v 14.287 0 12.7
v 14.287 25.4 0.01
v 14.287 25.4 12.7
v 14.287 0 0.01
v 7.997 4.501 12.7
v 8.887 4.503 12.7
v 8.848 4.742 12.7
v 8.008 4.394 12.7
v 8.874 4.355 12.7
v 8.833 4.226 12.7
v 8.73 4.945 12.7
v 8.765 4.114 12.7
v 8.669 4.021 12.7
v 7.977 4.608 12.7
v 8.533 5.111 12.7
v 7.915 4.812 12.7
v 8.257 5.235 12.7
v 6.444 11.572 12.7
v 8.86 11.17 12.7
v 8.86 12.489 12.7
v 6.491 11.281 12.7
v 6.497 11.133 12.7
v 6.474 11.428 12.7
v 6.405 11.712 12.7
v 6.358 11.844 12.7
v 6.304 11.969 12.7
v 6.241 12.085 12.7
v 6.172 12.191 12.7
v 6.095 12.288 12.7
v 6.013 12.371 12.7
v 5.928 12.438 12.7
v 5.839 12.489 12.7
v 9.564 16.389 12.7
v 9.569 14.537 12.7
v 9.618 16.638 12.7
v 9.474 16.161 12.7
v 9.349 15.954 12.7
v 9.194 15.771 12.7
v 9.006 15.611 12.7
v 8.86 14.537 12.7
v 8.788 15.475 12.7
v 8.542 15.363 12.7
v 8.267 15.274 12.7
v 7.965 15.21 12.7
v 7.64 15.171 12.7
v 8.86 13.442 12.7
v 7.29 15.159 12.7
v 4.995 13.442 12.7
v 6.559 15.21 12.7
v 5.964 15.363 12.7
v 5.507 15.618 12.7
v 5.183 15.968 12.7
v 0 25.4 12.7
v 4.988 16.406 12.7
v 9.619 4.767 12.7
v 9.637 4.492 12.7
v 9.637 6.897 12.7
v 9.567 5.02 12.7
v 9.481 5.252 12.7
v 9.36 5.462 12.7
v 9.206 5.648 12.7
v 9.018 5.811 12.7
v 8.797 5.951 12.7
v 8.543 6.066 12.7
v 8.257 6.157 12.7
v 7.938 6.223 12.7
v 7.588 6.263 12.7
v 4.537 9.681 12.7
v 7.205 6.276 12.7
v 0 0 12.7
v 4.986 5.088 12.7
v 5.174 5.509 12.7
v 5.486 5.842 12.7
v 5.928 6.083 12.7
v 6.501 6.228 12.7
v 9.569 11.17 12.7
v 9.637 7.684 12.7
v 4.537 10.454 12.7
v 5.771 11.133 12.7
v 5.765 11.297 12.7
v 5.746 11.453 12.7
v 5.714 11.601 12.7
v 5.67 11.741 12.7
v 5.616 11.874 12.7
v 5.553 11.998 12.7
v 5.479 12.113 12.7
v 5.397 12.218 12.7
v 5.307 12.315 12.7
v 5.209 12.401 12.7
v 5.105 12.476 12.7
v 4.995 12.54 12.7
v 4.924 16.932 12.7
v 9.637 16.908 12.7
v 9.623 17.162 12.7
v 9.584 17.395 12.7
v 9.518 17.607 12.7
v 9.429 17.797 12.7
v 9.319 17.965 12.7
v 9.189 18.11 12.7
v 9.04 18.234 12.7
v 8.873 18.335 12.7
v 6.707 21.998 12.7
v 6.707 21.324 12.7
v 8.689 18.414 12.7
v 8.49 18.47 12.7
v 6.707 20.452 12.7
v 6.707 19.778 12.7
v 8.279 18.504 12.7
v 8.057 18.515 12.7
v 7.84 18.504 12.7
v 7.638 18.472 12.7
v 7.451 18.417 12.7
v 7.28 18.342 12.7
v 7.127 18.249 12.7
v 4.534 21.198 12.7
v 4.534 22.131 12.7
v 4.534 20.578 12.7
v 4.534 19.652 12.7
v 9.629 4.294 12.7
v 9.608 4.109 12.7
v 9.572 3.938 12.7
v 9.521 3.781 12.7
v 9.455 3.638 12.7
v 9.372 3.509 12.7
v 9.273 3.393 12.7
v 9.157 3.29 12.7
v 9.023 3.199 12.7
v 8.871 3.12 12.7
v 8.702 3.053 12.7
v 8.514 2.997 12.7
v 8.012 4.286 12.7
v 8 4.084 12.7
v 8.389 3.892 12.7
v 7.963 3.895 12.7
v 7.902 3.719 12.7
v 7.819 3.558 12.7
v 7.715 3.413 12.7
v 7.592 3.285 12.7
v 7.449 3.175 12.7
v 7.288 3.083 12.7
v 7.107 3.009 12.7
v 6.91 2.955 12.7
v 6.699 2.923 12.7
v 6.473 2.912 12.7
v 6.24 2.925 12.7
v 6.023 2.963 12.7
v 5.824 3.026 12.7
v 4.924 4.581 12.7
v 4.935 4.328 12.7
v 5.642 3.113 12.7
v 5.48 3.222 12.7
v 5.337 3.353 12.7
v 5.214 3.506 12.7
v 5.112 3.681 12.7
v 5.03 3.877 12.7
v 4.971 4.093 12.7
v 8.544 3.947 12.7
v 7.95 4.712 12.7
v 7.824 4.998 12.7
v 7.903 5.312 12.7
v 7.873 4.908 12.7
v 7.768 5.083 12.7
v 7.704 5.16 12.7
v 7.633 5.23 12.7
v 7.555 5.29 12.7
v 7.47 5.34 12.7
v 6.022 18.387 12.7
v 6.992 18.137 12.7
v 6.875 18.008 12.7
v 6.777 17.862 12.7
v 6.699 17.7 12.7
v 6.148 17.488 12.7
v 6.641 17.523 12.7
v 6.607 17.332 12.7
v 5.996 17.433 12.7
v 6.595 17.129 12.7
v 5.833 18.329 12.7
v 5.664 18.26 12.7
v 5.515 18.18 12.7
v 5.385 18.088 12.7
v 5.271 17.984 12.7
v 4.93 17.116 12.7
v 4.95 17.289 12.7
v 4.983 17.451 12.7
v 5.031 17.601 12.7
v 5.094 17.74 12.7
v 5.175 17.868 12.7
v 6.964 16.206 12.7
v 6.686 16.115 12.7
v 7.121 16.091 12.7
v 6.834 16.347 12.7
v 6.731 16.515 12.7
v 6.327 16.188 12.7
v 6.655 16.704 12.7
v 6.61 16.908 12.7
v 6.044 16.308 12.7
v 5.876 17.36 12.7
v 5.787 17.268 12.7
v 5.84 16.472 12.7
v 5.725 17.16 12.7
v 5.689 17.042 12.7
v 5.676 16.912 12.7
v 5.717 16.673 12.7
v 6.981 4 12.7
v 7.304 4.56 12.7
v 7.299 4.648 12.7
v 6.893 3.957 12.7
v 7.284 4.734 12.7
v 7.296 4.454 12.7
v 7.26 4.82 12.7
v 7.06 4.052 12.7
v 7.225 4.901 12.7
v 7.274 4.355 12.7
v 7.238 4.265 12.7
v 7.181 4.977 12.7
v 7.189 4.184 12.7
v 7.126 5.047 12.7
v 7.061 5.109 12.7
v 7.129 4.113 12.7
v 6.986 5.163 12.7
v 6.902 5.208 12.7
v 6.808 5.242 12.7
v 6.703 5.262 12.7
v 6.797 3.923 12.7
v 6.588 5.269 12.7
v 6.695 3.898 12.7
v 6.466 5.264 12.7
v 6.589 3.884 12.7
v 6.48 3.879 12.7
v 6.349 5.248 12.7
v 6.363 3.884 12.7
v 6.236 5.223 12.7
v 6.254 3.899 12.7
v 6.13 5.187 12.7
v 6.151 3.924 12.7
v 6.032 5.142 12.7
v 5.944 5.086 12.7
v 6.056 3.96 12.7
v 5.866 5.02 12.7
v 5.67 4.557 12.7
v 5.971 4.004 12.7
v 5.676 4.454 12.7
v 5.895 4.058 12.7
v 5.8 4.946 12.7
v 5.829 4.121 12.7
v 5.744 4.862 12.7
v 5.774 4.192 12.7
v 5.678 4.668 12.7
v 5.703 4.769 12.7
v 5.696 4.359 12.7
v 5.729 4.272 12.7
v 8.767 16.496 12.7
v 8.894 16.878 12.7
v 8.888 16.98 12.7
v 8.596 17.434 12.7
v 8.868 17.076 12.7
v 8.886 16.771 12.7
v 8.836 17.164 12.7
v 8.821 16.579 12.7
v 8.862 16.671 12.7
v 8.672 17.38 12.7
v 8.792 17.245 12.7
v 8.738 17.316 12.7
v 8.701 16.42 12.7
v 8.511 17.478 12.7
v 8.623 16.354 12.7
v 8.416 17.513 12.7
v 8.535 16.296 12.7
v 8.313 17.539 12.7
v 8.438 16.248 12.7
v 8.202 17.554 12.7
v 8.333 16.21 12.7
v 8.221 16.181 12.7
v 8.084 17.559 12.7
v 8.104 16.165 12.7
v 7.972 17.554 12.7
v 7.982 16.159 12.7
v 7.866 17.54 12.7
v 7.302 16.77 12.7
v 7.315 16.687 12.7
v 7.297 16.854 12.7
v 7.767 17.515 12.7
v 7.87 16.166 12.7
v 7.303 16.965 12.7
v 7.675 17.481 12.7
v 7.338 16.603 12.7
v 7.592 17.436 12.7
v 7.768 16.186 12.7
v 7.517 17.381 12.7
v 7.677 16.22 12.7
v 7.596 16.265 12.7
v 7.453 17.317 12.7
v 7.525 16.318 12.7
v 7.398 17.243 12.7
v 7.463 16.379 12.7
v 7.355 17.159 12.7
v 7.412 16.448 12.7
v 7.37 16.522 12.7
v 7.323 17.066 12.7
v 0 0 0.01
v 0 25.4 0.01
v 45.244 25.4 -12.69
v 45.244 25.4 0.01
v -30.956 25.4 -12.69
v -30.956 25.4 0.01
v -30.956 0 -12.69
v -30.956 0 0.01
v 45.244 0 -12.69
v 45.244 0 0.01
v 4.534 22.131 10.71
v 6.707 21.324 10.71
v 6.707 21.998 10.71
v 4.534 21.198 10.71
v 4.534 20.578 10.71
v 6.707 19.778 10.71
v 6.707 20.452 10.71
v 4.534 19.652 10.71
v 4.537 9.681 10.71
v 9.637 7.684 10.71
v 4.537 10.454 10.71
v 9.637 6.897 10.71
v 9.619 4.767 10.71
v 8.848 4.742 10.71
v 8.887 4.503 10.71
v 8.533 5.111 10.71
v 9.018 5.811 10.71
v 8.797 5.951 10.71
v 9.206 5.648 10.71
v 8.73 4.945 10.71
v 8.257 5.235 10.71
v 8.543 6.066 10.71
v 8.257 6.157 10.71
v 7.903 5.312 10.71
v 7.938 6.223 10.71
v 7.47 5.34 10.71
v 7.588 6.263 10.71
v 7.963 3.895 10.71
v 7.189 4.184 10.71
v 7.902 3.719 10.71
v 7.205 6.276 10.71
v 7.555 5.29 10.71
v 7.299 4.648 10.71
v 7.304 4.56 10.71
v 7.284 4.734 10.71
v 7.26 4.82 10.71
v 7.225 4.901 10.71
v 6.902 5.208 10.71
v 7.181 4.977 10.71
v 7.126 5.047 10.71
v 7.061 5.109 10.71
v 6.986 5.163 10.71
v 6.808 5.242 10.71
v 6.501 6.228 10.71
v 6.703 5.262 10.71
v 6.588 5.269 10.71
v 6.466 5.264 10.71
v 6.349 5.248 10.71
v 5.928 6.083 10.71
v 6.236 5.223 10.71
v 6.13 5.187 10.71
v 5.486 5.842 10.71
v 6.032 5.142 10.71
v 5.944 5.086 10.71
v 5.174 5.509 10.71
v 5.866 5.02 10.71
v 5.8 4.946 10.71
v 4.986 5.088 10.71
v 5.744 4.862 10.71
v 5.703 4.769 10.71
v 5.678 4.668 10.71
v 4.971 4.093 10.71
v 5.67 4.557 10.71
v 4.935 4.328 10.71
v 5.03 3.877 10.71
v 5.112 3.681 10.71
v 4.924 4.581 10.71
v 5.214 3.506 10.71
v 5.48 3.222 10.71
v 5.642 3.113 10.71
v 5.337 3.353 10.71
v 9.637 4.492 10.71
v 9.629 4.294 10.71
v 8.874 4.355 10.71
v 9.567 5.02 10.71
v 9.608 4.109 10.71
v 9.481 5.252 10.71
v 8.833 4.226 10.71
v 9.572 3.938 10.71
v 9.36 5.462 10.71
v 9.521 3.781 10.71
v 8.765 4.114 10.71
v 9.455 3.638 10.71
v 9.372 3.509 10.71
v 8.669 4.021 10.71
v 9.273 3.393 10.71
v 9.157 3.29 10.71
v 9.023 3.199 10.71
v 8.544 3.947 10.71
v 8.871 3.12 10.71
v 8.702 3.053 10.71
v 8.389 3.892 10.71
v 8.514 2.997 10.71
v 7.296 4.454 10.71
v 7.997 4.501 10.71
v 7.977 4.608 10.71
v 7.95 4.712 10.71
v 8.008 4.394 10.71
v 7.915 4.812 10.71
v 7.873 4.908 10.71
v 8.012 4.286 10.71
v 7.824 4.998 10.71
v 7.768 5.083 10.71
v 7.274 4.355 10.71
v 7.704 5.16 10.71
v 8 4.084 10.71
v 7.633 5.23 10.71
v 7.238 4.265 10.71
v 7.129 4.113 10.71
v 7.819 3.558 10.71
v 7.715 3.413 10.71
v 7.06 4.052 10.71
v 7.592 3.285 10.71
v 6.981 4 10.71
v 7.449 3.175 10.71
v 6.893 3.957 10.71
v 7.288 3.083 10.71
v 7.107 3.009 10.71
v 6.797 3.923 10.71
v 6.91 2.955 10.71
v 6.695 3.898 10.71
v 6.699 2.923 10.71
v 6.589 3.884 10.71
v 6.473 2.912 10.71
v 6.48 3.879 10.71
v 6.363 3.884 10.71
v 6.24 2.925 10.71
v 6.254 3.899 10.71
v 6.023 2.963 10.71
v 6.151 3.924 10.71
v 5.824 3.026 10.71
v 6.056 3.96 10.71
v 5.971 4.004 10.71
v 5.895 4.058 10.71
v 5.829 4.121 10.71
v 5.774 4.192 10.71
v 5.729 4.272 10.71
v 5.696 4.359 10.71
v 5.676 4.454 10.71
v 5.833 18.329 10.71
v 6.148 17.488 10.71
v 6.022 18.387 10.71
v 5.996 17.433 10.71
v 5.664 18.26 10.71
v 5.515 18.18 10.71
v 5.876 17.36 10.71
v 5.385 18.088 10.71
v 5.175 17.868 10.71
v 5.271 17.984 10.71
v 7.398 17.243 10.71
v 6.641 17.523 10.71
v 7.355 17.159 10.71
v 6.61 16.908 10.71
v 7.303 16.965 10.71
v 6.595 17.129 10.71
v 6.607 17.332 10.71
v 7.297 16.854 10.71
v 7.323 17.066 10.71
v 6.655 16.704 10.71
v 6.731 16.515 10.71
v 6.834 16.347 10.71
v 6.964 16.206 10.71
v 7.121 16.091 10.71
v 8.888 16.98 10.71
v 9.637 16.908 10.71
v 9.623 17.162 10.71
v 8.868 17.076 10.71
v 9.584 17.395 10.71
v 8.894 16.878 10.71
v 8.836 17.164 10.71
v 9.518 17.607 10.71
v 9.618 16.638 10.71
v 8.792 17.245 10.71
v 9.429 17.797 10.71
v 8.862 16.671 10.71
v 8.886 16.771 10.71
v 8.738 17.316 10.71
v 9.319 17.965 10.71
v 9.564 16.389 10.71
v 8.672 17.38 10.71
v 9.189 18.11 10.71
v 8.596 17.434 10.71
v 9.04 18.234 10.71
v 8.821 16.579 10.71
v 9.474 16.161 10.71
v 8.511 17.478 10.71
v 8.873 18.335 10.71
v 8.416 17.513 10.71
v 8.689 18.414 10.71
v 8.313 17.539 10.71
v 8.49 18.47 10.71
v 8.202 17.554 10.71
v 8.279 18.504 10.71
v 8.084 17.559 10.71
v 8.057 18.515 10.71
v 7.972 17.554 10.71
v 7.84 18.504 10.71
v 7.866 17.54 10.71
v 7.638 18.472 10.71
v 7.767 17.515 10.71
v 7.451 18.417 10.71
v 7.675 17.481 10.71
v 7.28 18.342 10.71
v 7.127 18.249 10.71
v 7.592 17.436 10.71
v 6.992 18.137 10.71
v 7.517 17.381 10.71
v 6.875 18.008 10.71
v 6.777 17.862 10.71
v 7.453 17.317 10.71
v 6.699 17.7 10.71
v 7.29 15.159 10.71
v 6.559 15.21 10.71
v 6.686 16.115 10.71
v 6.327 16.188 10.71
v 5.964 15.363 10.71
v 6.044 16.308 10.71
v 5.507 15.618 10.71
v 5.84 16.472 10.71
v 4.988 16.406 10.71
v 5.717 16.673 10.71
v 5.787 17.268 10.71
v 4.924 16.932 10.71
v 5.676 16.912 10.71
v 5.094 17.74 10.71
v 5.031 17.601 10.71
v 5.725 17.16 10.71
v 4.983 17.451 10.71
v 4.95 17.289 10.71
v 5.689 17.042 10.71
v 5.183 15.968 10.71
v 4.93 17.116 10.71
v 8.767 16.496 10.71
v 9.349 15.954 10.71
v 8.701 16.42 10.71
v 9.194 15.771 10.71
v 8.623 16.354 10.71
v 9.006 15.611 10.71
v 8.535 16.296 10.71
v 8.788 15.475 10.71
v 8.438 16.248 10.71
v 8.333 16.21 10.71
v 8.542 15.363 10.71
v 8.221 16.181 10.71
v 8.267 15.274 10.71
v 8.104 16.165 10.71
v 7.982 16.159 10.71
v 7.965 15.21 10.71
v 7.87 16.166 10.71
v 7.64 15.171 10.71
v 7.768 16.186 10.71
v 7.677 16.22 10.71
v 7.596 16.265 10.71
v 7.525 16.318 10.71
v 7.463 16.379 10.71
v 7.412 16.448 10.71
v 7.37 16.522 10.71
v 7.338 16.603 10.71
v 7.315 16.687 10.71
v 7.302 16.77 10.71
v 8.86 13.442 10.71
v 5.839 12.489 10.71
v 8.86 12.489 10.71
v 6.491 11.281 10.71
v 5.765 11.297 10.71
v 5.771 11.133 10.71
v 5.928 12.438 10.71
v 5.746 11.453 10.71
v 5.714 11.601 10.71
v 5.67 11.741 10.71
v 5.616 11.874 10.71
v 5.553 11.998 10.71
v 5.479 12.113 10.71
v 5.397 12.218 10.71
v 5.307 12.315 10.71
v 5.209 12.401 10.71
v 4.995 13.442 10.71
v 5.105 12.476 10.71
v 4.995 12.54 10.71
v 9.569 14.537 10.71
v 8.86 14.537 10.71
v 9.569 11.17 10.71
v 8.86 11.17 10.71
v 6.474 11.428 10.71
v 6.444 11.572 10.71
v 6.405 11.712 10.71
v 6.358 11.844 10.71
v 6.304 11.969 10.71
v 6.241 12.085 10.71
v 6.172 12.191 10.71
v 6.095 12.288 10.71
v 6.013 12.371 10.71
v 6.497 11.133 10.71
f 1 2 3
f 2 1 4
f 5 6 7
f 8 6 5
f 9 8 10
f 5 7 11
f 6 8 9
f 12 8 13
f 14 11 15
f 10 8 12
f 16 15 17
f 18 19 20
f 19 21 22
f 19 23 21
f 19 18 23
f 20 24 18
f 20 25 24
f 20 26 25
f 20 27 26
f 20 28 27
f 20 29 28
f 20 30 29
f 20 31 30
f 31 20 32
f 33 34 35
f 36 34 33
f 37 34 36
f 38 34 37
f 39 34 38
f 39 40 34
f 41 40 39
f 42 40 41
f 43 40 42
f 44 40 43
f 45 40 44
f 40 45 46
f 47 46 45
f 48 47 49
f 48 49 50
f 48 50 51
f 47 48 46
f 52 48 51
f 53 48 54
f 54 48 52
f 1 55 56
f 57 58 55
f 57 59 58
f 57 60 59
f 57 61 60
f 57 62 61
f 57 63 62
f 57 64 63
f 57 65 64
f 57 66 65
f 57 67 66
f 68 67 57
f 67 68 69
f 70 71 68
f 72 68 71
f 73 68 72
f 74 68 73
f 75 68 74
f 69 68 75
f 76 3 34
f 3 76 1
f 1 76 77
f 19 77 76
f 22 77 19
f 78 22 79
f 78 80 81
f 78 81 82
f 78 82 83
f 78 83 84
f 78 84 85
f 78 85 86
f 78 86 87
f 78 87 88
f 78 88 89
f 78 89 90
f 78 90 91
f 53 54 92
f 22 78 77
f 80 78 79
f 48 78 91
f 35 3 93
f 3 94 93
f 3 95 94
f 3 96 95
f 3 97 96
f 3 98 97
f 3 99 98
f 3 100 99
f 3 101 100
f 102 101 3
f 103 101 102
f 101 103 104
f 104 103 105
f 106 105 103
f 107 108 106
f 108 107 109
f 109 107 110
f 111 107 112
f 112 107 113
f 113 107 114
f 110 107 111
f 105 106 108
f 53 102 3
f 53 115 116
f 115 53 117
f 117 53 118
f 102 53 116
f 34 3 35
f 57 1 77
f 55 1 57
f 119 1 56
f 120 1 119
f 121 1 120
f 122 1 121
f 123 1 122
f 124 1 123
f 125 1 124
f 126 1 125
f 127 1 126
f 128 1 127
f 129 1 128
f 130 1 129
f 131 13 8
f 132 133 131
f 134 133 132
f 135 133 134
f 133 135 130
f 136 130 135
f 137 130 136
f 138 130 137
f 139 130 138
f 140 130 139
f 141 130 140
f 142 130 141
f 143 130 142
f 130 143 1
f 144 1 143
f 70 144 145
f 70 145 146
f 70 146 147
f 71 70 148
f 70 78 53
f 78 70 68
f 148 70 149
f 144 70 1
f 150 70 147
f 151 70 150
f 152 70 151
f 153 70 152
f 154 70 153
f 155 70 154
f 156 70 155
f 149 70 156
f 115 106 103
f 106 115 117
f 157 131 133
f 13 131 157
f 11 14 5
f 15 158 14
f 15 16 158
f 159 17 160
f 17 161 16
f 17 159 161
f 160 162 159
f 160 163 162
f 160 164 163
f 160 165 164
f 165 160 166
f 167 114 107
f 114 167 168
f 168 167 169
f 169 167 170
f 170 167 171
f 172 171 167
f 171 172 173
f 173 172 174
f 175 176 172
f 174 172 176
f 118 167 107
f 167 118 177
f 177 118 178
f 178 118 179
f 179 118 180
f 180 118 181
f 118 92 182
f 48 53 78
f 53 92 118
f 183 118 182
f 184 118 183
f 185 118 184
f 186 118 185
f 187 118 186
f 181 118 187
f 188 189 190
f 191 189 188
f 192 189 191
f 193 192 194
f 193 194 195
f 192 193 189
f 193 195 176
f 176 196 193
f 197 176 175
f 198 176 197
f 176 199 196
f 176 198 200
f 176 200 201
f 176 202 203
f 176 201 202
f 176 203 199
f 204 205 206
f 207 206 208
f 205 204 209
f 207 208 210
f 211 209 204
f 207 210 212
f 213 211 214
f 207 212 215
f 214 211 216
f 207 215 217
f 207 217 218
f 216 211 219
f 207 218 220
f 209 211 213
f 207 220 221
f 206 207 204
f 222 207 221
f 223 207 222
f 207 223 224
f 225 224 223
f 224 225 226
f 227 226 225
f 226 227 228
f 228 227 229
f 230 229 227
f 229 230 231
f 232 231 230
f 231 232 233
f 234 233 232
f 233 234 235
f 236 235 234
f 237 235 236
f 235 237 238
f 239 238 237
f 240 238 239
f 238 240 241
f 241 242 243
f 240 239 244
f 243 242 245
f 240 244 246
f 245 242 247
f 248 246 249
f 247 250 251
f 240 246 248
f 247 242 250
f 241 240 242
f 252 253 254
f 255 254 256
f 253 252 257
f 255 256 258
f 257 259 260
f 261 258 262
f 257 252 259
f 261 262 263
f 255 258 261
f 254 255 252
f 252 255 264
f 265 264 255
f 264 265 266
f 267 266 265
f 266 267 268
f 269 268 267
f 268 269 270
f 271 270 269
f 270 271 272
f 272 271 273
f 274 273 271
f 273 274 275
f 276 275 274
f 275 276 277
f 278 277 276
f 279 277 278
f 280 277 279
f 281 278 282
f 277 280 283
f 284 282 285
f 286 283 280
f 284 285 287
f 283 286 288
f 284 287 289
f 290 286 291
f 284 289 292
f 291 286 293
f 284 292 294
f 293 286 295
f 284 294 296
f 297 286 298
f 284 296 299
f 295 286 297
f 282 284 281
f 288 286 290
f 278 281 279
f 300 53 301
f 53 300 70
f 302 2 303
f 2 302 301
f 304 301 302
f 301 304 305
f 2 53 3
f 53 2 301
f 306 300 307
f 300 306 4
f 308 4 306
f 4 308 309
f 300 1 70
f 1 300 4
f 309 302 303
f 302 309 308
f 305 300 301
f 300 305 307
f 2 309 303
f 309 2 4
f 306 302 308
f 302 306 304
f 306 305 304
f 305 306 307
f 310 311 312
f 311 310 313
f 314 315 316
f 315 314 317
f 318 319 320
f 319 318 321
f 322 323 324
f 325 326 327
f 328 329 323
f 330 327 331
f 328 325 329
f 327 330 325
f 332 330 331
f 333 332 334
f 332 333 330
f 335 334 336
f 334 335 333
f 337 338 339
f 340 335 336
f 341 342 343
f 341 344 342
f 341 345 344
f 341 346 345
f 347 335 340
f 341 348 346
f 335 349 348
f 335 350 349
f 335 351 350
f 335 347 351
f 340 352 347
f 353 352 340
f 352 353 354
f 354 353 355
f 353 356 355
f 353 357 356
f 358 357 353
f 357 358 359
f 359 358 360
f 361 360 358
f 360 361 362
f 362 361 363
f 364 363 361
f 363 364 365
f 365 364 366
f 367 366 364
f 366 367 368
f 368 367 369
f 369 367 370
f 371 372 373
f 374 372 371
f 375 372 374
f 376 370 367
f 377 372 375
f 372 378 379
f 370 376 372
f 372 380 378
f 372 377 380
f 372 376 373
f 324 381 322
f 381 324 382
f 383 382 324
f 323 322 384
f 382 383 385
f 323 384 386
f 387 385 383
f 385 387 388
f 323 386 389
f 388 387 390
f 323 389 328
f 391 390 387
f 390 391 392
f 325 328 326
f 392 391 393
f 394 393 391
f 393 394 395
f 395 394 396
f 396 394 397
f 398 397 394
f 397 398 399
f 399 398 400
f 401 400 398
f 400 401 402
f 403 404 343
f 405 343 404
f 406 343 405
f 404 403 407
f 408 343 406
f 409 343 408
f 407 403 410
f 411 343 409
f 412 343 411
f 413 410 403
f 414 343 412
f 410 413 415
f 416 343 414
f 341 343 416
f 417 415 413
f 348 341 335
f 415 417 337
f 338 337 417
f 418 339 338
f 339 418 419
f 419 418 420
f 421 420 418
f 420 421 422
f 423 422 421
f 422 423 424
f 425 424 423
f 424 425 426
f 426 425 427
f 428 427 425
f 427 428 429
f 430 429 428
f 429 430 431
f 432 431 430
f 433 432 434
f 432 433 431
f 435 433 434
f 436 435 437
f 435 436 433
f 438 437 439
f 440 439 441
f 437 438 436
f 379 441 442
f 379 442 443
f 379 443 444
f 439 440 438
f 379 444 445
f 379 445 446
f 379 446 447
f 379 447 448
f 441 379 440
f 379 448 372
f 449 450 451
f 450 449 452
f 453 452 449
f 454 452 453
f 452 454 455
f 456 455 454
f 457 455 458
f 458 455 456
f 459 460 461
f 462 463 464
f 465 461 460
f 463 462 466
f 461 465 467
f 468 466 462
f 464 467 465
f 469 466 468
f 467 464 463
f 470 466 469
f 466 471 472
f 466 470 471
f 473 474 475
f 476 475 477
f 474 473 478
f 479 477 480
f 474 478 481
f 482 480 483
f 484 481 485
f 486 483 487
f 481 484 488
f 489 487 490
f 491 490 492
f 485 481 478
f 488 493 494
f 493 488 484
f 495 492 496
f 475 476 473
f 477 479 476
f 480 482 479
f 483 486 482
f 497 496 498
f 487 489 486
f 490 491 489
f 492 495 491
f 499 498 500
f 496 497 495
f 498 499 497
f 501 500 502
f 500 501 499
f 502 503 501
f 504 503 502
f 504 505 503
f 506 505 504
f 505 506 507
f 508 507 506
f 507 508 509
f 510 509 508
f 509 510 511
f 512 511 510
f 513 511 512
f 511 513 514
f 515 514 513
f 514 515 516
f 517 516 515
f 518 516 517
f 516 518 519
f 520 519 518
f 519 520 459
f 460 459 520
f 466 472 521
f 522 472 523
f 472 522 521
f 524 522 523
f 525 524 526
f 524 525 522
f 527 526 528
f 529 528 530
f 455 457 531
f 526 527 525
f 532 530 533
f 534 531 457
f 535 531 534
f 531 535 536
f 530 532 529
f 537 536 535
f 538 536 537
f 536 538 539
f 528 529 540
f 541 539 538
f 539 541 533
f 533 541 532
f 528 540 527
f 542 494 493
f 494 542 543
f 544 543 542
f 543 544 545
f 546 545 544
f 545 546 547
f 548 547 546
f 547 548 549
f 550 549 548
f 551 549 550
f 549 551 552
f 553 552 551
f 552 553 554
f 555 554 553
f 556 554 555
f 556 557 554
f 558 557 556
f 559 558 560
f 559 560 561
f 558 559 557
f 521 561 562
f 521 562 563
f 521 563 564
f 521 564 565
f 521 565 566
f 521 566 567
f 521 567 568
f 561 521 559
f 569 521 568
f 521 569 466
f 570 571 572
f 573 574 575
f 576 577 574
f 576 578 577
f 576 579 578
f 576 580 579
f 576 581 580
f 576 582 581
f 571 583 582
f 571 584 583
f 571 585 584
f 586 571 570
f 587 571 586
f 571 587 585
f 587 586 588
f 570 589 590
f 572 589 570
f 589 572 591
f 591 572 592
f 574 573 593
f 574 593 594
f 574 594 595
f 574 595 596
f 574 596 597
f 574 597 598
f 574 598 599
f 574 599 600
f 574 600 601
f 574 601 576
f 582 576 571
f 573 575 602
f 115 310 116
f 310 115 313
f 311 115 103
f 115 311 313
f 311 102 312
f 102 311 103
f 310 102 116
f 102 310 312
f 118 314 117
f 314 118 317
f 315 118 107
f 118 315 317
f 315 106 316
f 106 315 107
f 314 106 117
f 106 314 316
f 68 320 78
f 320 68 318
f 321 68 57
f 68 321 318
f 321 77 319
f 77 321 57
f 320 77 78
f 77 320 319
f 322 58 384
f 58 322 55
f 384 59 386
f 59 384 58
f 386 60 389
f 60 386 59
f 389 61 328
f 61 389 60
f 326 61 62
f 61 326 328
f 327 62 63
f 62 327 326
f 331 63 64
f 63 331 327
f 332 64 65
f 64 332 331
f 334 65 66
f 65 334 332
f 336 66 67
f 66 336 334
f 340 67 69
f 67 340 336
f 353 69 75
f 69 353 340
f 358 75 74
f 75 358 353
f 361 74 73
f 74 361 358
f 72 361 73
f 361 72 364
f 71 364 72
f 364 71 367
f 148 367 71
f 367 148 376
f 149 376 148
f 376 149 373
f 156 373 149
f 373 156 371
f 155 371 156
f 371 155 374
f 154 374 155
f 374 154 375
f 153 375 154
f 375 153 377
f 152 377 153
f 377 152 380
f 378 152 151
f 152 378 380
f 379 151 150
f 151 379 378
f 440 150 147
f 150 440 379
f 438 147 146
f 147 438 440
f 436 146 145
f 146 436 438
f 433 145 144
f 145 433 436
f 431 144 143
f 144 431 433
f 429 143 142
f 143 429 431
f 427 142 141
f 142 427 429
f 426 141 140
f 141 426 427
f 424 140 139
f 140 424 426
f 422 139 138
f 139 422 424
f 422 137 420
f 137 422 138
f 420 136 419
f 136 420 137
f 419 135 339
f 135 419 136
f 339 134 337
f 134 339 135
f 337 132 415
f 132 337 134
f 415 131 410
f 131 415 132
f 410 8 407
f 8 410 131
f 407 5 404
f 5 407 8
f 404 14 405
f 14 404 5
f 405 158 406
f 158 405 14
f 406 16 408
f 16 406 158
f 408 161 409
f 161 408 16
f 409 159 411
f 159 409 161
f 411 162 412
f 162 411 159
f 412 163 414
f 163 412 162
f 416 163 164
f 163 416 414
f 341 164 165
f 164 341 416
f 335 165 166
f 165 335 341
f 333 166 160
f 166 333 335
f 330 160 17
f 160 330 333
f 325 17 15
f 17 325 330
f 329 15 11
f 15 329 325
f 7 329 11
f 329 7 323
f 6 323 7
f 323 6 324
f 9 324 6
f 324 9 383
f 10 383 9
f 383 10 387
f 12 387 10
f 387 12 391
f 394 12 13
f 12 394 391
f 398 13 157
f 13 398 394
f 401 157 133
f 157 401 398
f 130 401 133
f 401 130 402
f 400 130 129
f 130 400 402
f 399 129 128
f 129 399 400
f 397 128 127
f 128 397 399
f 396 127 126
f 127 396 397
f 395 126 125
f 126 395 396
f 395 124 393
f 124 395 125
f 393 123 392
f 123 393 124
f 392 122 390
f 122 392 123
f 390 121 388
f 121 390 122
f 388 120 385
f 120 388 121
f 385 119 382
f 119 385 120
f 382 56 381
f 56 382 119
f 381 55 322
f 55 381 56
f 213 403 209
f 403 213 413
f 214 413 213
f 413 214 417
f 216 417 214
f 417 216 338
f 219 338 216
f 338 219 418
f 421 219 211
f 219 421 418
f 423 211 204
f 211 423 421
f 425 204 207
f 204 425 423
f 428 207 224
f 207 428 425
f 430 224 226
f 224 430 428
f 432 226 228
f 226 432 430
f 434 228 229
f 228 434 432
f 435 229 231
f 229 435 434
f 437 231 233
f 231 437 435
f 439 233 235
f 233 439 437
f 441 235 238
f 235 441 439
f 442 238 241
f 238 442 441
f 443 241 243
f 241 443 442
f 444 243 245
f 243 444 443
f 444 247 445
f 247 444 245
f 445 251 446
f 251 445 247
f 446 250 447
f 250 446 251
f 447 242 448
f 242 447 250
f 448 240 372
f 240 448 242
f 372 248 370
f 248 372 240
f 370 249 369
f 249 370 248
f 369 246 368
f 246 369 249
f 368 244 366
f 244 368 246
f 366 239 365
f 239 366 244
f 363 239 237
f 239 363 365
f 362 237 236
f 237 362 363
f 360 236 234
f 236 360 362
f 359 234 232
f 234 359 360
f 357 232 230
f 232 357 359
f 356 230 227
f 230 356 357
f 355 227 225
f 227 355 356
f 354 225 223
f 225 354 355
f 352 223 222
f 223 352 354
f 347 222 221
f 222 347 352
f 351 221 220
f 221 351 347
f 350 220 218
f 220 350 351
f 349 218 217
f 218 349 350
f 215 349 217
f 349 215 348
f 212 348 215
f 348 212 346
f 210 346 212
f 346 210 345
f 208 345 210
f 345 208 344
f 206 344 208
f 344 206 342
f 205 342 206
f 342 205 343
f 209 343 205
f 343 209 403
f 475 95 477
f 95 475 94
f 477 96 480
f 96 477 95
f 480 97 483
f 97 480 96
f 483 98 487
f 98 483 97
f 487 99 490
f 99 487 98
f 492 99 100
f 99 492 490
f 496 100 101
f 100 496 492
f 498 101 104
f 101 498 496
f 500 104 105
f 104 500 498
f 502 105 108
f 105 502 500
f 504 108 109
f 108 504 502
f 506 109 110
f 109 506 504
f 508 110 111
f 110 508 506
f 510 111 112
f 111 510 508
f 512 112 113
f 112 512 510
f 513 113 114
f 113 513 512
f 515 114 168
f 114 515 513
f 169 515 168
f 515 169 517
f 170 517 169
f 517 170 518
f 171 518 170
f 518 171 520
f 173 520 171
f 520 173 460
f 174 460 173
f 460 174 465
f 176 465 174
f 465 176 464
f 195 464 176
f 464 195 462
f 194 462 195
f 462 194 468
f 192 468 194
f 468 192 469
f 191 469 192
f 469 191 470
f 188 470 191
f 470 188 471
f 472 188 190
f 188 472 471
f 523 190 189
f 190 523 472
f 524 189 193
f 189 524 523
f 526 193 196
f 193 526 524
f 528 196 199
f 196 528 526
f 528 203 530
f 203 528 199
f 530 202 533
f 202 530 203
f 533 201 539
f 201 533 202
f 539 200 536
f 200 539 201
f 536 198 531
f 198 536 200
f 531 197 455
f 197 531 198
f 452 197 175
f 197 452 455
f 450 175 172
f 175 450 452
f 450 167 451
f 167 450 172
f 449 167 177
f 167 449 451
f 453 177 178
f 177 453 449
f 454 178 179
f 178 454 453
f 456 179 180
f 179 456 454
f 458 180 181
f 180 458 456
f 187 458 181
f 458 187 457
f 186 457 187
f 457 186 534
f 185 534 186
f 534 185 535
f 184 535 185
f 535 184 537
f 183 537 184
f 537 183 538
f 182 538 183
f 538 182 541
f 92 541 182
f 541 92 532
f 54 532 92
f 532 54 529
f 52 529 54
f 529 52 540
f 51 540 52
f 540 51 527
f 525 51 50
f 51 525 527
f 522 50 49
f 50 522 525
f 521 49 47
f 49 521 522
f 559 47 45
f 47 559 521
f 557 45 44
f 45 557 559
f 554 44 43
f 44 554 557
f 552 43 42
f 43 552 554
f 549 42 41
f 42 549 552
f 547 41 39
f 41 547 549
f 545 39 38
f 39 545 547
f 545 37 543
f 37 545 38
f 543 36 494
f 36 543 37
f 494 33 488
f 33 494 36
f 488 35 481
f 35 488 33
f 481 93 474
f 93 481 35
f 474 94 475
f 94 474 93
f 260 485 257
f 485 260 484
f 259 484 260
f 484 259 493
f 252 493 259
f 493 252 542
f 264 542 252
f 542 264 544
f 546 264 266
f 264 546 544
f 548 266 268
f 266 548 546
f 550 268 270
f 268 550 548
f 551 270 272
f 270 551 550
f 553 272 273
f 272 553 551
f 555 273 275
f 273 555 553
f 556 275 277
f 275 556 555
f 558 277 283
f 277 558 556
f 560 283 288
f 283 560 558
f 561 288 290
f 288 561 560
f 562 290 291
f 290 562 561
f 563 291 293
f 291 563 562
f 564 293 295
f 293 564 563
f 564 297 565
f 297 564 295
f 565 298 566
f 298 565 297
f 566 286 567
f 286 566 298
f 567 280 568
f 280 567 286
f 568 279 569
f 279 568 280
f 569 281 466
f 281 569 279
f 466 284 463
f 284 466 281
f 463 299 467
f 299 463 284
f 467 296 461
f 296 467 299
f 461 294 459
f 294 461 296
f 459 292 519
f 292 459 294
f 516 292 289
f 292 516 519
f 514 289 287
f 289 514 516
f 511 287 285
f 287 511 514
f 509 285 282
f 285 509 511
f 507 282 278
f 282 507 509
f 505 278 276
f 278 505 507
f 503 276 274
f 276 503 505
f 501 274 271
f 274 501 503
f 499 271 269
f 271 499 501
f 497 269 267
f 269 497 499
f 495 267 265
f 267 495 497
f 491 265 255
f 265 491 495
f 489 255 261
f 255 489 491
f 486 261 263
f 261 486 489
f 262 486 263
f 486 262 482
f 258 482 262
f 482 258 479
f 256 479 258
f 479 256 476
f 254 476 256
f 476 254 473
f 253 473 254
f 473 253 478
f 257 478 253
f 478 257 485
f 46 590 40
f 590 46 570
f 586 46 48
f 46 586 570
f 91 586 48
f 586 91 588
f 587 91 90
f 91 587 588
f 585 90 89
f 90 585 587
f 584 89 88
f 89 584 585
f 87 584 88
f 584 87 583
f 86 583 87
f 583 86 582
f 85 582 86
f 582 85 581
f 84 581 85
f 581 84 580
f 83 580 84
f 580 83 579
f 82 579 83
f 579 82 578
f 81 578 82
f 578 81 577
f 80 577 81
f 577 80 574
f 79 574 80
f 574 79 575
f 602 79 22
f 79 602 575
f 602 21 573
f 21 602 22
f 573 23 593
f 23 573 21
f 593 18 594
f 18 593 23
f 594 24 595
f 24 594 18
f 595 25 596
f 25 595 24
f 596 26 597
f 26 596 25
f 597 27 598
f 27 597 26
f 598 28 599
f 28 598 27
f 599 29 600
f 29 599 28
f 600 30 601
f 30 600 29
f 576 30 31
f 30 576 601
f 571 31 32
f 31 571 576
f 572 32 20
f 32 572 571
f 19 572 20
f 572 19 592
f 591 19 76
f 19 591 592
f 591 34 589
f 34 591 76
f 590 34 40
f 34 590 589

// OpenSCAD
spacing = inch(9/16);
spacing_str = "9/16\"";
spacer_width = inch(1);
spacer_height = inch(0.5);
backer_length = inch(3);
backer_thickness = inch(0.5);
text_depth = 2;

function inch(n) = 25.4 * n;

difference() {
    union() {
        // spacer bar
        cube([spacing, spacer_width, spacer_height]);
        // backing plate
        translate([-1 * (backer_length / 2) + (spacing / 2), 0, (-1 * backer_thickness) + 0.01]) {
            cube([backer_length, spacer_width, backer_thickness]);
        }
    }
    translate([spacing / 2, spacer_width / 2, spacer_height - (text_depth - 0.01)]) {
        rotate([0,0,90]){
            #linear_extrude(text_depth){
                text(spacing_str, size=5, font="Liberation Mono:style=Bold", halign="center", valign="center");
            }
        }
    }
}
